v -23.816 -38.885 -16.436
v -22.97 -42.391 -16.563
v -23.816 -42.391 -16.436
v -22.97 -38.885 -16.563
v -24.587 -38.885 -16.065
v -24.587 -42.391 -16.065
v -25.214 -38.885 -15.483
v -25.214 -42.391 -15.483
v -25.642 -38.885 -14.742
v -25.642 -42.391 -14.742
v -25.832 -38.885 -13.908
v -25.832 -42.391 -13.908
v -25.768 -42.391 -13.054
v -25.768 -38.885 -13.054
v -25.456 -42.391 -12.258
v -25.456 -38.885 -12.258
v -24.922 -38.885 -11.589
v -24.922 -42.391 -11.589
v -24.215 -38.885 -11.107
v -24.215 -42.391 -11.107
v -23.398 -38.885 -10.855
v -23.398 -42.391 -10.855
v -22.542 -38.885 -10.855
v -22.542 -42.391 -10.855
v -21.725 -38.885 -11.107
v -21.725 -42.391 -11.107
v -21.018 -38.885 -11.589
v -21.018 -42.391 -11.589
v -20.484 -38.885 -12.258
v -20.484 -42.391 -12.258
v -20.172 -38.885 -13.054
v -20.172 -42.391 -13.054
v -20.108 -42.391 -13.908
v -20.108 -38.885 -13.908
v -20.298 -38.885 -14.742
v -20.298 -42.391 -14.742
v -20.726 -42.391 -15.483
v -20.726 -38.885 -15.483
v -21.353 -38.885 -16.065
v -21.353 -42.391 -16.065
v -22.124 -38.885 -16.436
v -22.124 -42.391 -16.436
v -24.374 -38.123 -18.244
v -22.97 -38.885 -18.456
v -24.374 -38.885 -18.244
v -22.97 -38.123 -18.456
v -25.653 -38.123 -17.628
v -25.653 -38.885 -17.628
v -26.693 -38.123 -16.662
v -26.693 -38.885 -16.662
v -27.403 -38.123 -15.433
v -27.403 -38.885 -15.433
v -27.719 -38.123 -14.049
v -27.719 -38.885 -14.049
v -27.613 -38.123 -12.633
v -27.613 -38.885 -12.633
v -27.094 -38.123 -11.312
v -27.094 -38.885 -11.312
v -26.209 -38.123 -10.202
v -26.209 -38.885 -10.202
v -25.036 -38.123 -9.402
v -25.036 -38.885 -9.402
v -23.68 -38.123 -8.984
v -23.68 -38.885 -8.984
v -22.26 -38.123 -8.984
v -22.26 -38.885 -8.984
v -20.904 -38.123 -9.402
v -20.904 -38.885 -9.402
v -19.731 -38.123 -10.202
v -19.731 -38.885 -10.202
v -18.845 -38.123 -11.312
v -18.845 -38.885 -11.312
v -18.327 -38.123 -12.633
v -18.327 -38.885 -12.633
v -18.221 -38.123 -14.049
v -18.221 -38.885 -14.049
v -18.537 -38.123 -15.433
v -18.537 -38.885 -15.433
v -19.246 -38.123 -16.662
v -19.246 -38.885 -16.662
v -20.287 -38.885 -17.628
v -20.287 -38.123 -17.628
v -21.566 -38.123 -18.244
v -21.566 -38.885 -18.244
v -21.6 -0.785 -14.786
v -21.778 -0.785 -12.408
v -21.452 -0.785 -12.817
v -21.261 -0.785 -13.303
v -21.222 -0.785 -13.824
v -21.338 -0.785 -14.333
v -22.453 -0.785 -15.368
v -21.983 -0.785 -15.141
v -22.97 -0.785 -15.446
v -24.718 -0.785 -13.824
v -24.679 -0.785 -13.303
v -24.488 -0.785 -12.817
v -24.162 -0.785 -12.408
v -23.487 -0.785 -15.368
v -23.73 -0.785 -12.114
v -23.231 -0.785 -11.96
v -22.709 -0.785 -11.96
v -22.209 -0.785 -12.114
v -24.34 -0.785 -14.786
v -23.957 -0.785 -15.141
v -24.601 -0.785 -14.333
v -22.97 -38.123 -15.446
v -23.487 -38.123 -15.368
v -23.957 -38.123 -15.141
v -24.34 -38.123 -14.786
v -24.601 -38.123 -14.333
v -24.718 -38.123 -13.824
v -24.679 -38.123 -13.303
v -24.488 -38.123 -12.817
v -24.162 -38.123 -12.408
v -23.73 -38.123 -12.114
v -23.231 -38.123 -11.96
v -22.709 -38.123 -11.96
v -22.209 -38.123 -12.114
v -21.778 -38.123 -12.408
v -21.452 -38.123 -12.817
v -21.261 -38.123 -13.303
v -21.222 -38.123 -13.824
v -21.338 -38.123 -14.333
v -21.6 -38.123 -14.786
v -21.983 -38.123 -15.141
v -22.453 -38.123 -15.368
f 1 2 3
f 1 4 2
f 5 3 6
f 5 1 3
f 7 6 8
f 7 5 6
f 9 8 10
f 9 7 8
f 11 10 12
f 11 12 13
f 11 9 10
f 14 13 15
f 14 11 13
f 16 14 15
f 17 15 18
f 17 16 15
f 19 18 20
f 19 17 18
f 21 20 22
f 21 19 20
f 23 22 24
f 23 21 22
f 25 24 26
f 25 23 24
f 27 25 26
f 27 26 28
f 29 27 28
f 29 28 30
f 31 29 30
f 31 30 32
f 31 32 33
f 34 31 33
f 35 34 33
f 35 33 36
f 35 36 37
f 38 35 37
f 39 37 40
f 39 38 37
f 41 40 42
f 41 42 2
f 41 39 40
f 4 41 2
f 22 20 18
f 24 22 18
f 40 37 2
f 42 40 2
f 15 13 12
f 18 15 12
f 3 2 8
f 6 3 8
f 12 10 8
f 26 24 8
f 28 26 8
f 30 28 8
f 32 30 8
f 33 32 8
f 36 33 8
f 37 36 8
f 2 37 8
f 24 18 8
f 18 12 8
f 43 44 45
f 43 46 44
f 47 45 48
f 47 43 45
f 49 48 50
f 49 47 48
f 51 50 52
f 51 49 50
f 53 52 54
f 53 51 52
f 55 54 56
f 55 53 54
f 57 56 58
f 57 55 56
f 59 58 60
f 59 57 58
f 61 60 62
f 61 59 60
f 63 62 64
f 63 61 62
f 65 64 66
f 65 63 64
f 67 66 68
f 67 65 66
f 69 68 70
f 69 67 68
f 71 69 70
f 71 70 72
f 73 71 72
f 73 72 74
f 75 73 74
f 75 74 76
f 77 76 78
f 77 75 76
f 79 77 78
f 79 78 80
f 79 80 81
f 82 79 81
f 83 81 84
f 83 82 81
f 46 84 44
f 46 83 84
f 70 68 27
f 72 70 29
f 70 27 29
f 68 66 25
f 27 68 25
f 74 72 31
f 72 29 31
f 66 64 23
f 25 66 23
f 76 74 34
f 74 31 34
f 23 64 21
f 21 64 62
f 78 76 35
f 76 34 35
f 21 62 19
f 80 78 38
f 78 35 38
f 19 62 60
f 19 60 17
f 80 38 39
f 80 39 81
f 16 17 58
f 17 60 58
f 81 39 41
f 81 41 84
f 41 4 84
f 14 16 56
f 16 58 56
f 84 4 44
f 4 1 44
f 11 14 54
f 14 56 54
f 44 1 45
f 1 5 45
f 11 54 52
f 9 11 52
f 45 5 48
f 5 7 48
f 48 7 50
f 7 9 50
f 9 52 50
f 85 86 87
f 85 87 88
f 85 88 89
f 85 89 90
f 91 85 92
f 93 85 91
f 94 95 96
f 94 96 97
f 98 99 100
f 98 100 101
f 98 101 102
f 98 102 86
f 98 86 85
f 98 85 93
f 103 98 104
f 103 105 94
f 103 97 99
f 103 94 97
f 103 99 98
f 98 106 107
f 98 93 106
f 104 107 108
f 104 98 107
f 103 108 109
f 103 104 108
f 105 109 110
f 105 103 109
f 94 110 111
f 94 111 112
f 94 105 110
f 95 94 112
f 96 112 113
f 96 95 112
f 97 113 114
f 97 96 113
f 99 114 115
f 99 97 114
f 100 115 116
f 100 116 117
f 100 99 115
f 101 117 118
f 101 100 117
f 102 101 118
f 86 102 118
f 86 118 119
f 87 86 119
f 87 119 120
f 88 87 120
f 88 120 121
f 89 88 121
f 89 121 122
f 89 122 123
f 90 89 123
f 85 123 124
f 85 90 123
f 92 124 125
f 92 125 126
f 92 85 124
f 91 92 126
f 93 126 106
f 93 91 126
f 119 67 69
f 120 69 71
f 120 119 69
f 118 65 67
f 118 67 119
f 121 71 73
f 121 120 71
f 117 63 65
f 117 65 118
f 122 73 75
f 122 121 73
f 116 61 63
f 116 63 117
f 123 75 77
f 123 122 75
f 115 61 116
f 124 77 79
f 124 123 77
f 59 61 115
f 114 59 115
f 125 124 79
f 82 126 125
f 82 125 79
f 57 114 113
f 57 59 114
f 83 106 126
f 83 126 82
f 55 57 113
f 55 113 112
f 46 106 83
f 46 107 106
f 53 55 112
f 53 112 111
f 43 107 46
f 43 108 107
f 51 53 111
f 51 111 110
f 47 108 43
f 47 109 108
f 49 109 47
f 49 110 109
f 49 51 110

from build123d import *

# Parameters (mm, degrees)
SKETCH1_ONE_SIDE_W   = 1.7526
SKETCH1_ONE_SIDE_H   = 38.1
SKETCH1_ONE_SIDE_W_2 = 2.8702
SKETCH1_ONE_SIDE_H_2 = 3.5052
SKETCH1_ONE_SIDE_W_3 = 4.7625
SKETCH1_ONE_SIDE_H_3 = 0.762


with BuildPart() as part:
    # Sketch1 one side → Revolve1 (revolve)
    with BuildSketch(Plane(origin=(-24.412739892, 0, -3.433041547), x_dir=(0.13925483139909503, 0, -0.9902565788380351), z_dir=(0.9902565788380351, 0, 0.13925483139909503)), mode=Mode.PRIVATE) as revolve1_sk:
        with Locations((9.484713498, -19.83540516)):
            Rectangle(SKETCH1_ONE_SIDE_W, SKETCH1_ONE_SIDE_H)
        with Locations((8.925913498, -40.63800516)):
            Rectangle(SKETCH1_ONE_SIDE_W_2, SKETCH1_ONE_SIDE_H_2)
        with Locations((7.979763498, -38.50440516)):
            Rectangle(SKETCH1_ONE_SIDE_W_3, SKETCH1_ONE_SIDE_H_3)
    revolve(revolve1_sk.sketch.rotate(Axis((-22.969918704, -42.39060516, -13.693103328), (0, 1, 0)), 188.004728857), axis=Axis((-22.969918704, -42.39060516, -13.693103328), (0, 1, 0)))


solid = part.part
